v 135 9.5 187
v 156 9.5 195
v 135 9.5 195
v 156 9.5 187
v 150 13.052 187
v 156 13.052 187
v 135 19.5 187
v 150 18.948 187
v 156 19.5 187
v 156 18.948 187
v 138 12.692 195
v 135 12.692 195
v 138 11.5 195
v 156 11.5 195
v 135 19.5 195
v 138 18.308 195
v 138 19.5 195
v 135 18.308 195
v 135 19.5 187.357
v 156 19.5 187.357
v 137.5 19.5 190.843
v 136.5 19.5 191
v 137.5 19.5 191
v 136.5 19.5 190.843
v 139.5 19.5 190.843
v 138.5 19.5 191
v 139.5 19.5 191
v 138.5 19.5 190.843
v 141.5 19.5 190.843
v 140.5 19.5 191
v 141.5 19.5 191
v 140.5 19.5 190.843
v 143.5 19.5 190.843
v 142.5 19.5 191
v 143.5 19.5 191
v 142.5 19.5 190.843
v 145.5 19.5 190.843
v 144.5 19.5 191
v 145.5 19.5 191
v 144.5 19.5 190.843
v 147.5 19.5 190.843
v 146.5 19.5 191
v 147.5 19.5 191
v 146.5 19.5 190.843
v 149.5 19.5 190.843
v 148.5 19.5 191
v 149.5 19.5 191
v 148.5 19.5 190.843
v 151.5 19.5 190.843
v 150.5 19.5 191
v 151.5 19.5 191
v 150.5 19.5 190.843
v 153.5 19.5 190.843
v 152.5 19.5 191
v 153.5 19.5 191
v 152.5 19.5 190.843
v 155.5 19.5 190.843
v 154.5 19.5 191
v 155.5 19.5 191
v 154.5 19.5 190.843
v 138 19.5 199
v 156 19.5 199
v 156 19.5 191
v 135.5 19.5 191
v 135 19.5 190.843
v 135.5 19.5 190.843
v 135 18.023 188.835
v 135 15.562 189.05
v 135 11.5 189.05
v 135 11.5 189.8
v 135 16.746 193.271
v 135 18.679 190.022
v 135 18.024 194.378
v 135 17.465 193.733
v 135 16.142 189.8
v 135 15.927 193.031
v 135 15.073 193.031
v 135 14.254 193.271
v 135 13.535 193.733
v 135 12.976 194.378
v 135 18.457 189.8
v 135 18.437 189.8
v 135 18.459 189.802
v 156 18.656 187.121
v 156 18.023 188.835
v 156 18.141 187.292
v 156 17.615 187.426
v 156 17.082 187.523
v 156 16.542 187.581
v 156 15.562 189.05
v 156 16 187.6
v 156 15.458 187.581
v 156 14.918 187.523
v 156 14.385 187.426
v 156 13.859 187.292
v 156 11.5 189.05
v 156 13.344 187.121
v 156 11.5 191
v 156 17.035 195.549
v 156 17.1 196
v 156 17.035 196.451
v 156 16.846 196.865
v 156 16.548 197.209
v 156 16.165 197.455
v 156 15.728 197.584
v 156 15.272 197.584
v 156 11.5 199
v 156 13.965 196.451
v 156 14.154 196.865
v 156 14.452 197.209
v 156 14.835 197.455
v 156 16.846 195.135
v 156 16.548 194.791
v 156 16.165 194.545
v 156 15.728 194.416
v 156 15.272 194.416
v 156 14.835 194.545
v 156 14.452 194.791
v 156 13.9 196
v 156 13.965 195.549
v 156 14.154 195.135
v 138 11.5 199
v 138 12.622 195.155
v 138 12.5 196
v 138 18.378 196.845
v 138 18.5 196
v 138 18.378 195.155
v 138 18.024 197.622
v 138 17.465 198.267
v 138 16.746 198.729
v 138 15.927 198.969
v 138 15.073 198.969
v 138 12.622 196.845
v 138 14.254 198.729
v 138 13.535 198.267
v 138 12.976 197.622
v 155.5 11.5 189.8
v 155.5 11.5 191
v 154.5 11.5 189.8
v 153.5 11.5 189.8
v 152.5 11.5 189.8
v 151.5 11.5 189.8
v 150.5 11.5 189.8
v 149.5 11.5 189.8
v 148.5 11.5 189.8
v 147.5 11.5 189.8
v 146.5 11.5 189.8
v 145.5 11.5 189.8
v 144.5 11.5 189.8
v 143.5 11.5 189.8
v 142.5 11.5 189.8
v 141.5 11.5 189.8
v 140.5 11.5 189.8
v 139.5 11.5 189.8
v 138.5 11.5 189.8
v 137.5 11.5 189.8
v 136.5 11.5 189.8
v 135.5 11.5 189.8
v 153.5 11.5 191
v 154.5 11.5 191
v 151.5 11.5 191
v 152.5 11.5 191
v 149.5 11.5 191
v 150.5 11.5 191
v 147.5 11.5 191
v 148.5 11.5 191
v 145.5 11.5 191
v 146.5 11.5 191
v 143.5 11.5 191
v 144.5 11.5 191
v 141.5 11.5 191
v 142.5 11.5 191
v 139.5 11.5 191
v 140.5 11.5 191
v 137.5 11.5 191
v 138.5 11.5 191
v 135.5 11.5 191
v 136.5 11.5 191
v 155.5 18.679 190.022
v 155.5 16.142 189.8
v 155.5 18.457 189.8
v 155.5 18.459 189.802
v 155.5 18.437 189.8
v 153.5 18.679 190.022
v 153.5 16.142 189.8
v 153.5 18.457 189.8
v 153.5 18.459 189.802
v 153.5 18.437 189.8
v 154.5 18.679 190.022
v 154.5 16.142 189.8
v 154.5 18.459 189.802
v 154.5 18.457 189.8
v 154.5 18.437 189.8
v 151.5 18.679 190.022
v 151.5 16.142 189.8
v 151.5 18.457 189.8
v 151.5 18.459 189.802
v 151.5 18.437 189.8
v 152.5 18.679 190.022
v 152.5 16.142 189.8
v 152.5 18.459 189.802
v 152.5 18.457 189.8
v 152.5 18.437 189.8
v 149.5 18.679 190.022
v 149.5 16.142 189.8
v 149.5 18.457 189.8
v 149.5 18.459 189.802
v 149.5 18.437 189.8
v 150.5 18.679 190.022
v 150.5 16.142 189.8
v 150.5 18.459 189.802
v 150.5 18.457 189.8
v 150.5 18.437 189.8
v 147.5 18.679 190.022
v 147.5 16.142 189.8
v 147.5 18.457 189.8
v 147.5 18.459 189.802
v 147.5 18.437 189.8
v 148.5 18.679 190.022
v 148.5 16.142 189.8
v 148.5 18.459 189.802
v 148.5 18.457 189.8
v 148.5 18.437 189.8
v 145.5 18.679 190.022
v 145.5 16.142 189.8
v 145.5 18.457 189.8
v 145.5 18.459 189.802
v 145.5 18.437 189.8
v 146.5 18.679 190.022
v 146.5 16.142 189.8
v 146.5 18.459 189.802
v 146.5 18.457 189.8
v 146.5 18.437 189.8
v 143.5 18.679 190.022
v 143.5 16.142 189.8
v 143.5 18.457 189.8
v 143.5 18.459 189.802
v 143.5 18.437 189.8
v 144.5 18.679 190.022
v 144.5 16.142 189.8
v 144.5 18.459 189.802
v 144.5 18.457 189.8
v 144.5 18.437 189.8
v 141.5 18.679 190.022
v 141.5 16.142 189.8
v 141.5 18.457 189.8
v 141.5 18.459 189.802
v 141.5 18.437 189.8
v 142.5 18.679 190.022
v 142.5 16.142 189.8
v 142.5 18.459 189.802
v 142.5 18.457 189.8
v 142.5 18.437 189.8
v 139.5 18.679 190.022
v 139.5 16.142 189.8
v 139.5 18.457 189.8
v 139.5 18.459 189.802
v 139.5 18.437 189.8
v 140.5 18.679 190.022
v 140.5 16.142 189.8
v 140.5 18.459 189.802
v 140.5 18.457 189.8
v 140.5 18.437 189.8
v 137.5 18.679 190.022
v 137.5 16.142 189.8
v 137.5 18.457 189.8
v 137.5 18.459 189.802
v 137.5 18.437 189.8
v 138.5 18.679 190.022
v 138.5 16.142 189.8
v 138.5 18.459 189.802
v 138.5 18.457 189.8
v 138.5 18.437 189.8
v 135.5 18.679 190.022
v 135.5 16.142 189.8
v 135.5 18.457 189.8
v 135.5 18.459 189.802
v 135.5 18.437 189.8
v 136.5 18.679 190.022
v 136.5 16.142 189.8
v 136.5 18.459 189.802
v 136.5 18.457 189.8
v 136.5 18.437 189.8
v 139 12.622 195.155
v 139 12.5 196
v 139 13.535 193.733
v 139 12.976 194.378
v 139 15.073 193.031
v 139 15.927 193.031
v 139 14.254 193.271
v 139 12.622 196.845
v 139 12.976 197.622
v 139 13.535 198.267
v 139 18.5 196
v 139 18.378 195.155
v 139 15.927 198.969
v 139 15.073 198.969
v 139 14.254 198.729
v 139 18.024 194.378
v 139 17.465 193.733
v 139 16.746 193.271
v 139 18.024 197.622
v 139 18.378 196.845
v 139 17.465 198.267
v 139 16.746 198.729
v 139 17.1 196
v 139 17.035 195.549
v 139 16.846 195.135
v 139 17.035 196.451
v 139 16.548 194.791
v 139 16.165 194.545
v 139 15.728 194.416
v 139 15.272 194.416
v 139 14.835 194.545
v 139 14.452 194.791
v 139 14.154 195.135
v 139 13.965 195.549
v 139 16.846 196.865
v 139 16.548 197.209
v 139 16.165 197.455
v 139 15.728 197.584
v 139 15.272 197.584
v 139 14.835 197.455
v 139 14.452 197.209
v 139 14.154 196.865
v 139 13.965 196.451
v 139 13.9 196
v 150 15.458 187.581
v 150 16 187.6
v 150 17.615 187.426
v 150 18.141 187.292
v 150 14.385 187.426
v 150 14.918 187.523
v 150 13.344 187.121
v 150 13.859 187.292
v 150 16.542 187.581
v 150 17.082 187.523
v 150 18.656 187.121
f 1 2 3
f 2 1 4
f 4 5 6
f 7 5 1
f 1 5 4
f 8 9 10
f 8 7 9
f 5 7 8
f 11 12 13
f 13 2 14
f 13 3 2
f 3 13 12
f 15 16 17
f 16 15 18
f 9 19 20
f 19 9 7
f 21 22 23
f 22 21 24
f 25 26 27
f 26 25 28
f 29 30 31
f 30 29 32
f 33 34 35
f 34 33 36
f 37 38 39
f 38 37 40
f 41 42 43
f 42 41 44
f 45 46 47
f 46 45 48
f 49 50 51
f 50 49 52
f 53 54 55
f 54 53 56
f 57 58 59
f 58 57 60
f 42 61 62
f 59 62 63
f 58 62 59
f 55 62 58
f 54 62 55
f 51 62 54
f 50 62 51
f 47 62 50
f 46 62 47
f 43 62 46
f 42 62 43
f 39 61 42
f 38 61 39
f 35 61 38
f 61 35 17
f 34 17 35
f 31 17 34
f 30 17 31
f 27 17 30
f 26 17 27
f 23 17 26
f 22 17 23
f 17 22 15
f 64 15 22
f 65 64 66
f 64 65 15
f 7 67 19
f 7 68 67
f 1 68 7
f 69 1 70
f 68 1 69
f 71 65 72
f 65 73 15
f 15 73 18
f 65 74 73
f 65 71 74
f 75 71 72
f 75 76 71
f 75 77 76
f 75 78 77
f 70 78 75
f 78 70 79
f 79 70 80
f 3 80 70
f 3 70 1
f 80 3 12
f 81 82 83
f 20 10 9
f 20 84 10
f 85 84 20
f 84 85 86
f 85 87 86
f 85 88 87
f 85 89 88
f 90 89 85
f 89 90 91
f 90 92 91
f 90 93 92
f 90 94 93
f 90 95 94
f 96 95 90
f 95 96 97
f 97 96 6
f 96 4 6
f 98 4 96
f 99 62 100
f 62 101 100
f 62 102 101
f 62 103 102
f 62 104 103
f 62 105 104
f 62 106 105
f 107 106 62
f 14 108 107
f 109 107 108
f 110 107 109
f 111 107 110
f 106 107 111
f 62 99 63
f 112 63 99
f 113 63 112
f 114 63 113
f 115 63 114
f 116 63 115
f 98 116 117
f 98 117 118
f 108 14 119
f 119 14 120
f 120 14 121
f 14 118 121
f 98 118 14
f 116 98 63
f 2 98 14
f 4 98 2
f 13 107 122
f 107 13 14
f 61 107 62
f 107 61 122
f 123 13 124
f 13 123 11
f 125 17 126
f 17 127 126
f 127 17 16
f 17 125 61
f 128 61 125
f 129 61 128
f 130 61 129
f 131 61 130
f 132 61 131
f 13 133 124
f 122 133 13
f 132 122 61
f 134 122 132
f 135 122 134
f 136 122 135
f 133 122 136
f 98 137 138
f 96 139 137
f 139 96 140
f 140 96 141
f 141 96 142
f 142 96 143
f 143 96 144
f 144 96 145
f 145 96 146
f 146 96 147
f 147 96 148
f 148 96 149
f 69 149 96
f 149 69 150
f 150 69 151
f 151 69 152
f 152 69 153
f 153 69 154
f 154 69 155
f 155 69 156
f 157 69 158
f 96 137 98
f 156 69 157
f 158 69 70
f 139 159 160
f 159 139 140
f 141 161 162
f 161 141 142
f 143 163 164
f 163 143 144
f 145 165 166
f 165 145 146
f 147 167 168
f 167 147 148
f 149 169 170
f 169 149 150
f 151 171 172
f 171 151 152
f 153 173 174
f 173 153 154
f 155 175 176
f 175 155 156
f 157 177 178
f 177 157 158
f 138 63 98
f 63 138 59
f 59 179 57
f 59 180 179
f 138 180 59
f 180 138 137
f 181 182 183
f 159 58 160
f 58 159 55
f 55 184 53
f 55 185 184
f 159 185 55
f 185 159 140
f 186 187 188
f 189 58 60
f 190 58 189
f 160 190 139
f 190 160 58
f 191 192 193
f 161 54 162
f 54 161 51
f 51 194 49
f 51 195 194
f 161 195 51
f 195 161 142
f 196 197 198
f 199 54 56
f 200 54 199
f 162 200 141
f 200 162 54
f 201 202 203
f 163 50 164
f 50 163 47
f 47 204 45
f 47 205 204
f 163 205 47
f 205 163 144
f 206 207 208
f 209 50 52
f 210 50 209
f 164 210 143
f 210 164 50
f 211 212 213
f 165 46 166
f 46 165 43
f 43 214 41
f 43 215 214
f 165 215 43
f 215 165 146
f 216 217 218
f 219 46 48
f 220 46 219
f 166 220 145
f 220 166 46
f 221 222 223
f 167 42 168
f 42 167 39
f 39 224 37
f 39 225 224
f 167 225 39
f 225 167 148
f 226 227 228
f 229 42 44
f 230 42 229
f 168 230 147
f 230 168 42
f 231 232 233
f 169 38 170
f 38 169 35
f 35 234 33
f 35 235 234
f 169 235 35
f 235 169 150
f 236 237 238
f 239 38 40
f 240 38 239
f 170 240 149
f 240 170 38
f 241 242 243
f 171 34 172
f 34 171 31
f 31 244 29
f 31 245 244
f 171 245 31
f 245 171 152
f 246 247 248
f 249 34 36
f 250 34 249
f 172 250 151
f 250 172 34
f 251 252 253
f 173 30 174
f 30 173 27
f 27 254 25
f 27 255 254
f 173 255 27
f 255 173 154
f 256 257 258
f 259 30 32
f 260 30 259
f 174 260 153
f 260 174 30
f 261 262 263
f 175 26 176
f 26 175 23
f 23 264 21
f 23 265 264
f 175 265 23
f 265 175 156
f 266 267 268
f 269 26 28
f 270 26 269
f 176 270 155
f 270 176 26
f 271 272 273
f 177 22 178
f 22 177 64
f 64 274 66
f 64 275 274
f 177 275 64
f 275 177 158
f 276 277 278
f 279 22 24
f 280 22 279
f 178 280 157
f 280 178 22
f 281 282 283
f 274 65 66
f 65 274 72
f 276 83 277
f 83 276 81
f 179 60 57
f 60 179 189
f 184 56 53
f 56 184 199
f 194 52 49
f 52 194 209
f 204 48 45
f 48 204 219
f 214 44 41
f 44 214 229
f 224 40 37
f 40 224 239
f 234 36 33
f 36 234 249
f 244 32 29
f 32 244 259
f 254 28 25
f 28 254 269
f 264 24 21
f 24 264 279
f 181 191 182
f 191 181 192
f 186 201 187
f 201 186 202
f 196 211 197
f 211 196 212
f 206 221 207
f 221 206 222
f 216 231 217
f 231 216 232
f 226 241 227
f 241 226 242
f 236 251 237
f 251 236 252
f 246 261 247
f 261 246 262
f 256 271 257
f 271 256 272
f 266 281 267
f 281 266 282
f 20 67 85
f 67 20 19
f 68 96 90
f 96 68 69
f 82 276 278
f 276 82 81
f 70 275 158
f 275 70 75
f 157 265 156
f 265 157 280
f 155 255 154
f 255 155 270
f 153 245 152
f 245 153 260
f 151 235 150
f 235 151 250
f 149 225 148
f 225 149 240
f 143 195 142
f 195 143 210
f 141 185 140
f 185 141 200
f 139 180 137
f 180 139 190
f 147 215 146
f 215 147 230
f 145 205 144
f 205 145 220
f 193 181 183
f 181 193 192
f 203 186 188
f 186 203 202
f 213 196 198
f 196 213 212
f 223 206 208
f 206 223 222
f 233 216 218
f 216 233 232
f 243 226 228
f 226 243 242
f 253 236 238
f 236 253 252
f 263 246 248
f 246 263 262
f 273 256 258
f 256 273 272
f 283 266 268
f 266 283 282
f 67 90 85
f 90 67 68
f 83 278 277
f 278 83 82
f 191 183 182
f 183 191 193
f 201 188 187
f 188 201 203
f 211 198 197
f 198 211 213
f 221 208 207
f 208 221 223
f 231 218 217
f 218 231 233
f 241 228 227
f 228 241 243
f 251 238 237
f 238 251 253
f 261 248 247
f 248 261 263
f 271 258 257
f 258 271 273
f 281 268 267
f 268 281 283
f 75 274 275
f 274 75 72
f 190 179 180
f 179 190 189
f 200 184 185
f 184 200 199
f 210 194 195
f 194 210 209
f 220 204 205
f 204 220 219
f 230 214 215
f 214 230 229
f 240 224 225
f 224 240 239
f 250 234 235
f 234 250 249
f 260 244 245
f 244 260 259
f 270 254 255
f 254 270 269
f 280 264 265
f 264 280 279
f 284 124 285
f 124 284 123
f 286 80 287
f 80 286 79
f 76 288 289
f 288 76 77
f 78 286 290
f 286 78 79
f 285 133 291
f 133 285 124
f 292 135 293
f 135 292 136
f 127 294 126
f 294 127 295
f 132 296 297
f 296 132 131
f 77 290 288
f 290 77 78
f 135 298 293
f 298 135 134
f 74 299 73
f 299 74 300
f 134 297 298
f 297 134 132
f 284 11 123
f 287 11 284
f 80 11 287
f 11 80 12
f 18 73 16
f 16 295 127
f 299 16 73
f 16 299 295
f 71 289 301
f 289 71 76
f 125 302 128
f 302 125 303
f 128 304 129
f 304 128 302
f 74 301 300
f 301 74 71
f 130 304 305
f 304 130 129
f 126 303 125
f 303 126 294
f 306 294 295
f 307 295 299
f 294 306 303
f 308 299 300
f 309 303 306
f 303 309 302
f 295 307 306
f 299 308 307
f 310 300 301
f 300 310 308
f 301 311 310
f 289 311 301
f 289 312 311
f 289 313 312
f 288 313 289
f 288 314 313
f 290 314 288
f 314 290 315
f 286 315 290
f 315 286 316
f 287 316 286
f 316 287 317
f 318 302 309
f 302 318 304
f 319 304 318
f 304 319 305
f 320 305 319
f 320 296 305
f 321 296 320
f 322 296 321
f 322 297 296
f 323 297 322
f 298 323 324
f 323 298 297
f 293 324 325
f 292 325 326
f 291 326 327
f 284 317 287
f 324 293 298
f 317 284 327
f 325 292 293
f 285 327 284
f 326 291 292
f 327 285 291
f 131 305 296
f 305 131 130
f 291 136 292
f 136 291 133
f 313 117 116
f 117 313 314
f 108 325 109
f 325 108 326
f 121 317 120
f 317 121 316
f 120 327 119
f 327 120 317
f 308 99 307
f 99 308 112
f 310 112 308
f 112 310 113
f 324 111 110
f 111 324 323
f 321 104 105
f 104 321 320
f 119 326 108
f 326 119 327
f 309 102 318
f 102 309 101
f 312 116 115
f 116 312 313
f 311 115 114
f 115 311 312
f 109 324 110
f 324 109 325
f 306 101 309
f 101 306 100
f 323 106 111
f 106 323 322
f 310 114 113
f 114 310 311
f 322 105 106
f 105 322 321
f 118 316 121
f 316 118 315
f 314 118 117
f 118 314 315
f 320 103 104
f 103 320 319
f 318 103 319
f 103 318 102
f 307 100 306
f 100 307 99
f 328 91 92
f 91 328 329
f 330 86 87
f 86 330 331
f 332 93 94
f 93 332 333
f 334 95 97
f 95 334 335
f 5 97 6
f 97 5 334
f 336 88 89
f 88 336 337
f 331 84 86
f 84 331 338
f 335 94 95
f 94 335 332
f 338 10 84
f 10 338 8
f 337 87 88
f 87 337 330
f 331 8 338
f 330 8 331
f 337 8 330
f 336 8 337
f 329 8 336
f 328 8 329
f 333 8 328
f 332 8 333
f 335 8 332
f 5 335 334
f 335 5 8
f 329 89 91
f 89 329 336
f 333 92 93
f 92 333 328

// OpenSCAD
// xctest
// x carriage test for belt attach


// Height of x rods, 62-304
High0=150;        

// Left extruder position, 150+
LeftX0=150; 

// Right extruder position, 82+
RightX0=82+50;

// Show frame
frameOn=1;

// Show top z brackets
tops=1;  

// Show ybed ------------------
ybed=1;    

// Length front, back, top rail
x1=480;         

// Length side rails
y1=330;      

// Length of towers -----------
z1=380;       

// Center to Tower 
ytower=-57.2; 

// Tower to Z-axis, >0
ybracket=6;            

// Height of z rods
zoff2=43;   

// Distance zrod to zscrew
xrodscrew=26;     

// Offset of zscrew
zscrew = -7;

// Height of bottom x motor
zmotor1=45;    

// Delta between x motors
zmotorD=19;    

// Offset x motors from center of towers
xmot0=-2;

//---------------------------------
// Computed values based on parameters
zmotor2=zmotor1+zmotorD;

x2=x1/2;
y2=y1/2;
F2=88;



//---------------------------------------
// fixed part
module belt1(){
difference(){
    // base block
    translate([-5,-9,25]) cube([12,22,14]);

    // belt entry 
    translate([-7.5,-10,34.9]) rotate([0,45,0]) cube([3,32,3]);
    
    // belt slot
    translate([-8.5,-16,34.2]) cube([11.5,32,0.75]);
    translate([-8.5,-16,35.4]) rotate([0,5,0]) cube([11.5,32,0.2]);
    translate([-8.5,-16,33.6]) rotate([0,-5,0]) cube([11.5,32,0.2]);
    
    // belt teeth
    for (_step =[-16:2:16]){
      translate([-8.5,_step+0.5,33]) cube([11.5,1,1.5]);
    }

    // nut clearance
    translate([-6,-10,24]) 
    cube([9,6,8]);

    // screw hole
    translate([-1,16,28]) 
    rotate([90,0,0])
    cylinder(r=1.6,h=30,$fn=22);

  }
}

//---------------------------------------
// movable part
module belt2(){
difference(){
  union(){
    // base block
    translate([-5,-9,29]) cube([10,21,8]);
    // extra for the screw
    translate([-5,-9,25]) cube([8,18,10]);
  }

    // belt entry 
    translate([-7.5,-10,34.9]) rotate([0,45,0]) cube([3,32,3]);
    
    // belt slot
    translate([-8.5,-16,34.2]) cube([11.5,32,0.75]);
    translate([-8.5,-16,35.4]) rotate([0,5,0]) cube([11.5,32,0.2]);
    translate([-8.5,-16,33.6]) rotate([0,-5,0]) cube([11.5,32,0.2]);
    
    // belt teeth
    for (_step =[-16:2:16]){
      translate([-8.5,_step+0.5,33]) cube([11.5,1,1.5]);
    }
    
    // screw head clearance M3x?
    translate([-1,16,28]) 
    rotate([90,0,0])
    cylinder(r=3,h=8,$fn=22);

    // screw hole
    translate([-1,16,28]) 
    rotate([90,0,0])
    cylinder(r=1.6,h=30,$fn=22);
    
  }
  
}
//---------------------------------------
// movable part slot cutter
module belt3(){
    // base block
    translate([-5,-12,29-0.2]) cube([10,26,8.4]);

}


//==============================================

type=1;
X0=LeftX0;

if(0){
difference(){
    // vertical block
    color("cyan")
    translate([+480/2-X0+42,4.5,High0+35])
    cube([50,6.5,15]);

    
    // slot for movable part of belt attach
    if(type==1){
      translate([+480/2-X0+57,14.5,High0+74])
      rotate([0,180,90])
      belt3();
    }
}
      // belt attach solid
      difference(){
        translate([+480/2-X0+81,14.5,High0+74])
        rotate([0,180,90])
        belt1();  
        
        // cut for the lm8u
        translate([+480/2-X0+80+22,0+16,High0+30])
        rotate([-90,0,90])
        cylinder(r=15/2+0.1,h=68,$fn=F2);
        
      }
}



// left extruder belt slider
if(1){
X5=LeftX0;
difference(){
// belt attach movable
  translate([+480/2-X5+57,14.5,High0+74])
  rotate([0,180,90])
  belt2();  
// cut for lm8u clearance
  translate([+480/2-X5+70,0+16,High0+30])
  rotate([-90,0,90])
  cylinder(r=15/2+0.1,h=10,$fn=F2);
}
}

if(0){
// test tension screw
  color("orange")
  translate([+480/2-LeftX0+88,15.5,High0+46])
  rotate([-90,0,90])
  cylinder(r=1.5,h=40,$fn=22);
}
